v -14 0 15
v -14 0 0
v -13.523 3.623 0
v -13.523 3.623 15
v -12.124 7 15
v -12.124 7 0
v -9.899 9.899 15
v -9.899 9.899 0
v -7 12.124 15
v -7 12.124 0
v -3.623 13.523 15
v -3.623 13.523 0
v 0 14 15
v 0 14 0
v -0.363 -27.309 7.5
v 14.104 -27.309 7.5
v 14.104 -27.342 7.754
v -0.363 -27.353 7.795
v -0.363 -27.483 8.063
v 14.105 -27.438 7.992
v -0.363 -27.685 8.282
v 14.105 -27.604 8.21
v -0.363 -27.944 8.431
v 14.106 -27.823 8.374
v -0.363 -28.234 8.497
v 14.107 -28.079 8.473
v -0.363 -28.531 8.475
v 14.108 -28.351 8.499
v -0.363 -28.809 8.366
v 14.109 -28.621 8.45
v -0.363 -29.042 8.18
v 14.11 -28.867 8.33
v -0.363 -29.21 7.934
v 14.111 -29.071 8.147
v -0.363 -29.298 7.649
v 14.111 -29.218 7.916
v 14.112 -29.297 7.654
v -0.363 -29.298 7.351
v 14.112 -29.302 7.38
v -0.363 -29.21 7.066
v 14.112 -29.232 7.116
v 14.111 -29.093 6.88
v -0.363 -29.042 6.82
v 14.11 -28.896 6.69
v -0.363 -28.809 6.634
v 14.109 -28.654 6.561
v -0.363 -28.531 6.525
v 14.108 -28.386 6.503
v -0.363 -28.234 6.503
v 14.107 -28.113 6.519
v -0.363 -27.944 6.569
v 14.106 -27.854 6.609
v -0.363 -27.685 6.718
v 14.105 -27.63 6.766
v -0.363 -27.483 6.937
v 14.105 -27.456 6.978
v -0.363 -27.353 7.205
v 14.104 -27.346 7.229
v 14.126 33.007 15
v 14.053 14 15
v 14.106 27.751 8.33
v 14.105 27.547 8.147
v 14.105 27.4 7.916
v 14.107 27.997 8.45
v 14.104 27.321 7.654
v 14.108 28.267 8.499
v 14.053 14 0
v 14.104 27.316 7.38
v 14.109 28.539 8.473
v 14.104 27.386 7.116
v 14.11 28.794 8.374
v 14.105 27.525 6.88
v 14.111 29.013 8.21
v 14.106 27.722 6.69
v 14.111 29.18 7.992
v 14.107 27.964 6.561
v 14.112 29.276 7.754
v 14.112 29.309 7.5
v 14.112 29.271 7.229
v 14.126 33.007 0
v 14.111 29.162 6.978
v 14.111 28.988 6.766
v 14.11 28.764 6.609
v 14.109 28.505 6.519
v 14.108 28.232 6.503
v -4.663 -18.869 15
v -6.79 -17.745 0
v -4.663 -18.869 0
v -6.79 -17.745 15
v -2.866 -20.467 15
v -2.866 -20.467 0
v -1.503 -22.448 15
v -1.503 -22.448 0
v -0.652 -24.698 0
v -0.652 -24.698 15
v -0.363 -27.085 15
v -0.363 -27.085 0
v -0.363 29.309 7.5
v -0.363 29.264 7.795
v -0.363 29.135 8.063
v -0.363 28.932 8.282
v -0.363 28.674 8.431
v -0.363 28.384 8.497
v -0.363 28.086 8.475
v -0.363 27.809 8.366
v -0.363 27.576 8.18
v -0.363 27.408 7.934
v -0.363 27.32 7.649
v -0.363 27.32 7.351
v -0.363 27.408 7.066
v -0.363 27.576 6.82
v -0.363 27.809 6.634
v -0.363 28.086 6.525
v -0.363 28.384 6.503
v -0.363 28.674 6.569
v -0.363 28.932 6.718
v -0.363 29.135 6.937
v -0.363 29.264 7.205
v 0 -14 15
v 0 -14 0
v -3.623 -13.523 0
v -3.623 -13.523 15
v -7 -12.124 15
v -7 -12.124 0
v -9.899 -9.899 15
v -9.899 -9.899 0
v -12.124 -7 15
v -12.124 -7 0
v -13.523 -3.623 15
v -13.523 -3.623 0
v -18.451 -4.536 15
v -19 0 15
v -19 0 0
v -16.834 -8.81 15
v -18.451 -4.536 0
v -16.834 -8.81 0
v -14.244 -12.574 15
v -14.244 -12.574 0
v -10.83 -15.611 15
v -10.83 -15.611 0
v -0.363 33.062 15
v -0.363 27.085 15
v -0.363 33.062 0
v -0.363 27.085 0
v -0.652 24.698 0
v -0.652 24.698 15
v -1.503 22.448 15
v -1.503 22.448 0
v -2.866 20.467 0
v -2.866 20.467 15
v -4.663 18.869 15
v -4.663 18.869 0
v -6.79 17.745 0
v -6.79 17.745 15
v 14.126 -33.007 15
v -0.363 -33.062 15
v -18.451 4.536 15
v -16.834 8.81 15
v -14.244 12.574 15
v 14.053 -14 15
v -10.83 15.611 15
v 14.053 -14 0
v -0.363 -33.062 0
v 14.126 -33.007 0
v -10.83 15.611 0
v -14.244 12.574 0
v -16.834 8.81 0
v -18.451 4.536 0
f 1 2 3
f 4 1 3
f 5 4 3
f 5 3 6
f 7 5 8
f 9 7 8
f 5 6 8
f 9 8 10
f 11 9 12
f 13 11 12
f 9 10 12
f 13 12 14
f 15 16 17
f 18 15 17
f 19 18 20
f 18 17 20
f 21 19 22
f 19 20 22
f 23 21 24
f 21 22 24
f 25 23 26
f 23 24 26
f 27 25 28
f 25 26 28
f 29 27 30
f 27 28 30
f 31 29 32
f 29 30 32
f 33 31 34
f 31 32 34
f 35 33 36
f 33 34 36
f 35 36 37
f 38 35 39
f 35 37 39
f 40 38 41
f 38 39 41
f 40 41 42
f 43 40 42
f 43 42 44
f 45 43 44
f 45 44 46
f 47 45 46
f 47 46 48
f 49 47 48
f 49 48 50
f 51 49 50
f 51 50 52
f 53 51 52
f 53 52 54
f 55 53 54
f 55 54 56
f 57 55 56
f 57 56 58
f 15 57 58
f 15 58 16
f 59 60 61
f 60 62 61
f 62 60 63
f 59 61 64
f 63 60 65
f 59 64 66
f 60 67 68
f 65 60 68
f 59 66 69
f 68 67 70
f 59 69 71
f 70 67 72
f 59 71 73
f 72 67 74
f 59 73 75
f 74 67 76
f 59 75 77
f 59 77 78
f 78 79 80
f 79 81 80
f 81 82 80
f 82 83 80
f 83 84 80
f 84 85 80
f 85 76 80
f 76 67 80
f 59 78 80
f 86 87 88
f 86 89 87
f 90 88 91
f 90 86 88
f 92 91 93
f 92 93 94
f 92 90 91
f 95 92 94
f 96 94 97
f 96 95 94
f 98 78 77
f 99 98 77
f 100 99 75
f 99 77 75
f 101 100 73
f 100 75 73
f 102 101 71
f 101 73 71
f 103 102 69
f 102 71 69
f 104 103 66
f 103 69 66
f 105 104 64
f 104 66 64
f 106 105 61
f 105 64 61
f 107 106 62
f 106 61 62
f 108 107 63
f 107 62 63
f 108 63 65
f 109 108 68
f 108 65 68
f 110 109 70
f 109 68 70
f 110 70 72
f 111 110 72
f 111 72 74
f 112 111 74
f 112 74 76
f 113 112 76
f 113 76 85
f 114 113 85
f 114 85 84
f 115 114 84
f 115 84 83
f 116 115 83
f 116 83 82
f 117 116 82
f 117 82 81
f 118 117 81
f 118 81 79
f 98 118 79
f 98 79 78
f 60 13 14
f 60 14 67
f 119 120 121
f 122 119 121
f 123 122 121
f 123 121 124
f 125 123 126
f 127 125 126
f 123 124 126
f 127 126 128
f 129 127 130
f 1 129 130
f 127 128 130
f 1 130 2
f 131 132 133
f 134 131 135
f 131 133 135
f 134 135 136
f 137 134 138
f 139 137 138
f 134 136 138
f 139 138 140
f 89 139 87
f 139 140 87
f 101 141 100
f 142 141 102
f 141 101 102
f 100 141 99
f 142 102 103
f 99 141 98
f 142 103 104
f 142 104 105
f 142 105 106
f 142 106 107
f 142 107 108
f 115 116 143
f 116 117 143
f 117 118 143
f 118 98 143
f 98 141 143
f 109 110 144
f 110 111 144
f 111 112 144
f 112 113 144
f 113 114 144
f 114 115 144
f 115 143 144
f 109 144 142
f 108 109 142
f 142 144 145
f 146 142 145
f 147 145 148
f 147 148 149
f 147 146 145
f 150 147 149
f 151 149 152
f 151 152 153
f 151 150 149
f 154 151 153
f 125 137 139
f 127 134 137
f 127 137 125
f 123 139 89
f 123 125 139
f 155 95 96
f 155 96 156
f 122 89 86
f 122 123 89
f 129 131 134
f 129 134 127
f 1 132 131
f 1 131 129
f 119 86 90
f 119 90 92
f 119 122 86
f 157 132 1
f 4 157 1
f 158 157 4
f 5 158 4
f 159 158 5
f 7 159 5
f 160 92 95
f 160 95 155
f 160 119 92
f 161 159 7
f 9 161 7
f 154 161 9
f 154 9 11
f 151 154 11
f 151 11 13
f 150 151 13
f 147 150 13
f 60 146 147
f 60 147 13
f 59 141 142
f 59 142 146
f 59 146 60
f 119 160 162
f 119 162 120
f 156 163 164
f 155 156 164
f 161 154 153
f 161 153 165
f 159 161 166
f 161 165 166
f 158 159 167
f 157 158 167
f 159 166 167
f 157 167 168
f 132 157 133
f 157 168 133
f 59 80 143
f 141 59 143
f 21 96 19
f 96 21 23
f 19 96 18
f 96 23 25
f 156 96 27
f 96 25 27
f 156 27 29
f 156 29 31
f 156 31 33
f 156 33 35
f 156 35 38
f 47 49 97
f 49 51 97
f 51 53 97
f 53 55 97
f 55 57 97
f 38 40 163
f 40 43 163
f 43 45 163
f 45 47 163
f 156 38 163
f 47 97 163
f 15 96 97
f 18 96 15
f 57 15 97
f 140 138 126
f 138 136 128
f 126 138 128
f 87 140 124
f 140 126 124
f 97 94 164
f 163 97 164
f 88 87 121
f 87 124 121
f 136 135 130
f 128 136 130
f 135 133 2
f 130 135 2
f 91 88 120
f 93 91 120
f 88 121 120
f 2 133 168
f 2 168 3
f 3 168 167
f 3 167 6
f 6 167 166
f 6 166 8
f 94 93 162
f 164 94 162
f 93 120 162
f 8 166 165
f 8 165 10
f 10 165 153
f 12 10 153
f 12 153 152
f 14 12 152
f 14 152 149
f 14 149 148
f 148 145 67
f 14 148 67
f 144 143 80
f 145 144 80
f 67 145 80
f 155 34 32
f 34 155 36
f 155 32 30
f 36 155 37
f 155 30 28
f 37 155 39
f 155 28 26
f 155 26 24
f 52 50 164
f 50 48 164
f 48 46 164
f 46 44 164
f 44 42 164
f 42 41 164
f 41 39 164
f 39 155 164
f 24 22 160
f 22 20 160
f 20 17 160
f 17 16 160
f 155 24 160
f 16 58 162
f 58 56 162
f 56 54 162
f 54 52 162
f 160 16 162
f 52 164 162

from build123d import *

# Parameters (mm, degrees)
F1_DEPTH = 15
F2_R     = 10
F4_D     = 2


with BuildPart() as f1:
    # F0 (on Top) → F1 (new body)
    with BuildSketch(Plane.XY):
        with BuildLine():
            Line((-19, 0), (-14, 0))
            ThreePointArc((-14, 0), (-9.899495, 9.899495), (0, 14))
            Line((0, 14), (14.053407, 14))
            Line((14.053407, 14), (14.125915, 33.006928))
            Line((14.125915, 33.006928), (-0.363272, 33.062202))
            Line((-0.363272, 33.062202), (-0.363272, 18.996527))
            ThreePointArc((-0.363272, 18.996527), (-13.562857, 13.305973), (-19, 0))
        make_face()
        with BuildLine():
            ThreePointArc((0, -14), (-9.899495, -9.899495), (-14, 0))
            Line((-14, 0), (-19, 0))
            ThreePointArc((-19, 0), (-13.562857, -13.305973), (-0.363272, -18.996527))
            Line((-0.363272, -18.996527), (-0.363272, -33.062202))
            Line((-0.363272, -33.062202), (14.125915, -33.006928))
            Line((14.125915, -33.006928), (14.053407, -14))
            Line((14.053407, -14), (0, -14))
        make_face()
    extrude(amount=F1_DEPTH)

    # F2
    f2_edges = [f1.edges().sort_by_distance(p)[0] for p in [
        (-0.363272, 18.996527, 7.5),
        (-0.363272, -18.996527, 7.5),
    ]]
    fillet(f2_edges, radius=F2_R)

    # F4 (through all)
    with Locations(Plane(origin=(-0.363272, 0, 0), x_dir=(0, -1, 0), z_dir=(-1, 0, 0))):
        with Locations((-28.308908, 7.5), (28.308908, 7.5)):
            Hole(F4_D / 2)


solid = f1.part
